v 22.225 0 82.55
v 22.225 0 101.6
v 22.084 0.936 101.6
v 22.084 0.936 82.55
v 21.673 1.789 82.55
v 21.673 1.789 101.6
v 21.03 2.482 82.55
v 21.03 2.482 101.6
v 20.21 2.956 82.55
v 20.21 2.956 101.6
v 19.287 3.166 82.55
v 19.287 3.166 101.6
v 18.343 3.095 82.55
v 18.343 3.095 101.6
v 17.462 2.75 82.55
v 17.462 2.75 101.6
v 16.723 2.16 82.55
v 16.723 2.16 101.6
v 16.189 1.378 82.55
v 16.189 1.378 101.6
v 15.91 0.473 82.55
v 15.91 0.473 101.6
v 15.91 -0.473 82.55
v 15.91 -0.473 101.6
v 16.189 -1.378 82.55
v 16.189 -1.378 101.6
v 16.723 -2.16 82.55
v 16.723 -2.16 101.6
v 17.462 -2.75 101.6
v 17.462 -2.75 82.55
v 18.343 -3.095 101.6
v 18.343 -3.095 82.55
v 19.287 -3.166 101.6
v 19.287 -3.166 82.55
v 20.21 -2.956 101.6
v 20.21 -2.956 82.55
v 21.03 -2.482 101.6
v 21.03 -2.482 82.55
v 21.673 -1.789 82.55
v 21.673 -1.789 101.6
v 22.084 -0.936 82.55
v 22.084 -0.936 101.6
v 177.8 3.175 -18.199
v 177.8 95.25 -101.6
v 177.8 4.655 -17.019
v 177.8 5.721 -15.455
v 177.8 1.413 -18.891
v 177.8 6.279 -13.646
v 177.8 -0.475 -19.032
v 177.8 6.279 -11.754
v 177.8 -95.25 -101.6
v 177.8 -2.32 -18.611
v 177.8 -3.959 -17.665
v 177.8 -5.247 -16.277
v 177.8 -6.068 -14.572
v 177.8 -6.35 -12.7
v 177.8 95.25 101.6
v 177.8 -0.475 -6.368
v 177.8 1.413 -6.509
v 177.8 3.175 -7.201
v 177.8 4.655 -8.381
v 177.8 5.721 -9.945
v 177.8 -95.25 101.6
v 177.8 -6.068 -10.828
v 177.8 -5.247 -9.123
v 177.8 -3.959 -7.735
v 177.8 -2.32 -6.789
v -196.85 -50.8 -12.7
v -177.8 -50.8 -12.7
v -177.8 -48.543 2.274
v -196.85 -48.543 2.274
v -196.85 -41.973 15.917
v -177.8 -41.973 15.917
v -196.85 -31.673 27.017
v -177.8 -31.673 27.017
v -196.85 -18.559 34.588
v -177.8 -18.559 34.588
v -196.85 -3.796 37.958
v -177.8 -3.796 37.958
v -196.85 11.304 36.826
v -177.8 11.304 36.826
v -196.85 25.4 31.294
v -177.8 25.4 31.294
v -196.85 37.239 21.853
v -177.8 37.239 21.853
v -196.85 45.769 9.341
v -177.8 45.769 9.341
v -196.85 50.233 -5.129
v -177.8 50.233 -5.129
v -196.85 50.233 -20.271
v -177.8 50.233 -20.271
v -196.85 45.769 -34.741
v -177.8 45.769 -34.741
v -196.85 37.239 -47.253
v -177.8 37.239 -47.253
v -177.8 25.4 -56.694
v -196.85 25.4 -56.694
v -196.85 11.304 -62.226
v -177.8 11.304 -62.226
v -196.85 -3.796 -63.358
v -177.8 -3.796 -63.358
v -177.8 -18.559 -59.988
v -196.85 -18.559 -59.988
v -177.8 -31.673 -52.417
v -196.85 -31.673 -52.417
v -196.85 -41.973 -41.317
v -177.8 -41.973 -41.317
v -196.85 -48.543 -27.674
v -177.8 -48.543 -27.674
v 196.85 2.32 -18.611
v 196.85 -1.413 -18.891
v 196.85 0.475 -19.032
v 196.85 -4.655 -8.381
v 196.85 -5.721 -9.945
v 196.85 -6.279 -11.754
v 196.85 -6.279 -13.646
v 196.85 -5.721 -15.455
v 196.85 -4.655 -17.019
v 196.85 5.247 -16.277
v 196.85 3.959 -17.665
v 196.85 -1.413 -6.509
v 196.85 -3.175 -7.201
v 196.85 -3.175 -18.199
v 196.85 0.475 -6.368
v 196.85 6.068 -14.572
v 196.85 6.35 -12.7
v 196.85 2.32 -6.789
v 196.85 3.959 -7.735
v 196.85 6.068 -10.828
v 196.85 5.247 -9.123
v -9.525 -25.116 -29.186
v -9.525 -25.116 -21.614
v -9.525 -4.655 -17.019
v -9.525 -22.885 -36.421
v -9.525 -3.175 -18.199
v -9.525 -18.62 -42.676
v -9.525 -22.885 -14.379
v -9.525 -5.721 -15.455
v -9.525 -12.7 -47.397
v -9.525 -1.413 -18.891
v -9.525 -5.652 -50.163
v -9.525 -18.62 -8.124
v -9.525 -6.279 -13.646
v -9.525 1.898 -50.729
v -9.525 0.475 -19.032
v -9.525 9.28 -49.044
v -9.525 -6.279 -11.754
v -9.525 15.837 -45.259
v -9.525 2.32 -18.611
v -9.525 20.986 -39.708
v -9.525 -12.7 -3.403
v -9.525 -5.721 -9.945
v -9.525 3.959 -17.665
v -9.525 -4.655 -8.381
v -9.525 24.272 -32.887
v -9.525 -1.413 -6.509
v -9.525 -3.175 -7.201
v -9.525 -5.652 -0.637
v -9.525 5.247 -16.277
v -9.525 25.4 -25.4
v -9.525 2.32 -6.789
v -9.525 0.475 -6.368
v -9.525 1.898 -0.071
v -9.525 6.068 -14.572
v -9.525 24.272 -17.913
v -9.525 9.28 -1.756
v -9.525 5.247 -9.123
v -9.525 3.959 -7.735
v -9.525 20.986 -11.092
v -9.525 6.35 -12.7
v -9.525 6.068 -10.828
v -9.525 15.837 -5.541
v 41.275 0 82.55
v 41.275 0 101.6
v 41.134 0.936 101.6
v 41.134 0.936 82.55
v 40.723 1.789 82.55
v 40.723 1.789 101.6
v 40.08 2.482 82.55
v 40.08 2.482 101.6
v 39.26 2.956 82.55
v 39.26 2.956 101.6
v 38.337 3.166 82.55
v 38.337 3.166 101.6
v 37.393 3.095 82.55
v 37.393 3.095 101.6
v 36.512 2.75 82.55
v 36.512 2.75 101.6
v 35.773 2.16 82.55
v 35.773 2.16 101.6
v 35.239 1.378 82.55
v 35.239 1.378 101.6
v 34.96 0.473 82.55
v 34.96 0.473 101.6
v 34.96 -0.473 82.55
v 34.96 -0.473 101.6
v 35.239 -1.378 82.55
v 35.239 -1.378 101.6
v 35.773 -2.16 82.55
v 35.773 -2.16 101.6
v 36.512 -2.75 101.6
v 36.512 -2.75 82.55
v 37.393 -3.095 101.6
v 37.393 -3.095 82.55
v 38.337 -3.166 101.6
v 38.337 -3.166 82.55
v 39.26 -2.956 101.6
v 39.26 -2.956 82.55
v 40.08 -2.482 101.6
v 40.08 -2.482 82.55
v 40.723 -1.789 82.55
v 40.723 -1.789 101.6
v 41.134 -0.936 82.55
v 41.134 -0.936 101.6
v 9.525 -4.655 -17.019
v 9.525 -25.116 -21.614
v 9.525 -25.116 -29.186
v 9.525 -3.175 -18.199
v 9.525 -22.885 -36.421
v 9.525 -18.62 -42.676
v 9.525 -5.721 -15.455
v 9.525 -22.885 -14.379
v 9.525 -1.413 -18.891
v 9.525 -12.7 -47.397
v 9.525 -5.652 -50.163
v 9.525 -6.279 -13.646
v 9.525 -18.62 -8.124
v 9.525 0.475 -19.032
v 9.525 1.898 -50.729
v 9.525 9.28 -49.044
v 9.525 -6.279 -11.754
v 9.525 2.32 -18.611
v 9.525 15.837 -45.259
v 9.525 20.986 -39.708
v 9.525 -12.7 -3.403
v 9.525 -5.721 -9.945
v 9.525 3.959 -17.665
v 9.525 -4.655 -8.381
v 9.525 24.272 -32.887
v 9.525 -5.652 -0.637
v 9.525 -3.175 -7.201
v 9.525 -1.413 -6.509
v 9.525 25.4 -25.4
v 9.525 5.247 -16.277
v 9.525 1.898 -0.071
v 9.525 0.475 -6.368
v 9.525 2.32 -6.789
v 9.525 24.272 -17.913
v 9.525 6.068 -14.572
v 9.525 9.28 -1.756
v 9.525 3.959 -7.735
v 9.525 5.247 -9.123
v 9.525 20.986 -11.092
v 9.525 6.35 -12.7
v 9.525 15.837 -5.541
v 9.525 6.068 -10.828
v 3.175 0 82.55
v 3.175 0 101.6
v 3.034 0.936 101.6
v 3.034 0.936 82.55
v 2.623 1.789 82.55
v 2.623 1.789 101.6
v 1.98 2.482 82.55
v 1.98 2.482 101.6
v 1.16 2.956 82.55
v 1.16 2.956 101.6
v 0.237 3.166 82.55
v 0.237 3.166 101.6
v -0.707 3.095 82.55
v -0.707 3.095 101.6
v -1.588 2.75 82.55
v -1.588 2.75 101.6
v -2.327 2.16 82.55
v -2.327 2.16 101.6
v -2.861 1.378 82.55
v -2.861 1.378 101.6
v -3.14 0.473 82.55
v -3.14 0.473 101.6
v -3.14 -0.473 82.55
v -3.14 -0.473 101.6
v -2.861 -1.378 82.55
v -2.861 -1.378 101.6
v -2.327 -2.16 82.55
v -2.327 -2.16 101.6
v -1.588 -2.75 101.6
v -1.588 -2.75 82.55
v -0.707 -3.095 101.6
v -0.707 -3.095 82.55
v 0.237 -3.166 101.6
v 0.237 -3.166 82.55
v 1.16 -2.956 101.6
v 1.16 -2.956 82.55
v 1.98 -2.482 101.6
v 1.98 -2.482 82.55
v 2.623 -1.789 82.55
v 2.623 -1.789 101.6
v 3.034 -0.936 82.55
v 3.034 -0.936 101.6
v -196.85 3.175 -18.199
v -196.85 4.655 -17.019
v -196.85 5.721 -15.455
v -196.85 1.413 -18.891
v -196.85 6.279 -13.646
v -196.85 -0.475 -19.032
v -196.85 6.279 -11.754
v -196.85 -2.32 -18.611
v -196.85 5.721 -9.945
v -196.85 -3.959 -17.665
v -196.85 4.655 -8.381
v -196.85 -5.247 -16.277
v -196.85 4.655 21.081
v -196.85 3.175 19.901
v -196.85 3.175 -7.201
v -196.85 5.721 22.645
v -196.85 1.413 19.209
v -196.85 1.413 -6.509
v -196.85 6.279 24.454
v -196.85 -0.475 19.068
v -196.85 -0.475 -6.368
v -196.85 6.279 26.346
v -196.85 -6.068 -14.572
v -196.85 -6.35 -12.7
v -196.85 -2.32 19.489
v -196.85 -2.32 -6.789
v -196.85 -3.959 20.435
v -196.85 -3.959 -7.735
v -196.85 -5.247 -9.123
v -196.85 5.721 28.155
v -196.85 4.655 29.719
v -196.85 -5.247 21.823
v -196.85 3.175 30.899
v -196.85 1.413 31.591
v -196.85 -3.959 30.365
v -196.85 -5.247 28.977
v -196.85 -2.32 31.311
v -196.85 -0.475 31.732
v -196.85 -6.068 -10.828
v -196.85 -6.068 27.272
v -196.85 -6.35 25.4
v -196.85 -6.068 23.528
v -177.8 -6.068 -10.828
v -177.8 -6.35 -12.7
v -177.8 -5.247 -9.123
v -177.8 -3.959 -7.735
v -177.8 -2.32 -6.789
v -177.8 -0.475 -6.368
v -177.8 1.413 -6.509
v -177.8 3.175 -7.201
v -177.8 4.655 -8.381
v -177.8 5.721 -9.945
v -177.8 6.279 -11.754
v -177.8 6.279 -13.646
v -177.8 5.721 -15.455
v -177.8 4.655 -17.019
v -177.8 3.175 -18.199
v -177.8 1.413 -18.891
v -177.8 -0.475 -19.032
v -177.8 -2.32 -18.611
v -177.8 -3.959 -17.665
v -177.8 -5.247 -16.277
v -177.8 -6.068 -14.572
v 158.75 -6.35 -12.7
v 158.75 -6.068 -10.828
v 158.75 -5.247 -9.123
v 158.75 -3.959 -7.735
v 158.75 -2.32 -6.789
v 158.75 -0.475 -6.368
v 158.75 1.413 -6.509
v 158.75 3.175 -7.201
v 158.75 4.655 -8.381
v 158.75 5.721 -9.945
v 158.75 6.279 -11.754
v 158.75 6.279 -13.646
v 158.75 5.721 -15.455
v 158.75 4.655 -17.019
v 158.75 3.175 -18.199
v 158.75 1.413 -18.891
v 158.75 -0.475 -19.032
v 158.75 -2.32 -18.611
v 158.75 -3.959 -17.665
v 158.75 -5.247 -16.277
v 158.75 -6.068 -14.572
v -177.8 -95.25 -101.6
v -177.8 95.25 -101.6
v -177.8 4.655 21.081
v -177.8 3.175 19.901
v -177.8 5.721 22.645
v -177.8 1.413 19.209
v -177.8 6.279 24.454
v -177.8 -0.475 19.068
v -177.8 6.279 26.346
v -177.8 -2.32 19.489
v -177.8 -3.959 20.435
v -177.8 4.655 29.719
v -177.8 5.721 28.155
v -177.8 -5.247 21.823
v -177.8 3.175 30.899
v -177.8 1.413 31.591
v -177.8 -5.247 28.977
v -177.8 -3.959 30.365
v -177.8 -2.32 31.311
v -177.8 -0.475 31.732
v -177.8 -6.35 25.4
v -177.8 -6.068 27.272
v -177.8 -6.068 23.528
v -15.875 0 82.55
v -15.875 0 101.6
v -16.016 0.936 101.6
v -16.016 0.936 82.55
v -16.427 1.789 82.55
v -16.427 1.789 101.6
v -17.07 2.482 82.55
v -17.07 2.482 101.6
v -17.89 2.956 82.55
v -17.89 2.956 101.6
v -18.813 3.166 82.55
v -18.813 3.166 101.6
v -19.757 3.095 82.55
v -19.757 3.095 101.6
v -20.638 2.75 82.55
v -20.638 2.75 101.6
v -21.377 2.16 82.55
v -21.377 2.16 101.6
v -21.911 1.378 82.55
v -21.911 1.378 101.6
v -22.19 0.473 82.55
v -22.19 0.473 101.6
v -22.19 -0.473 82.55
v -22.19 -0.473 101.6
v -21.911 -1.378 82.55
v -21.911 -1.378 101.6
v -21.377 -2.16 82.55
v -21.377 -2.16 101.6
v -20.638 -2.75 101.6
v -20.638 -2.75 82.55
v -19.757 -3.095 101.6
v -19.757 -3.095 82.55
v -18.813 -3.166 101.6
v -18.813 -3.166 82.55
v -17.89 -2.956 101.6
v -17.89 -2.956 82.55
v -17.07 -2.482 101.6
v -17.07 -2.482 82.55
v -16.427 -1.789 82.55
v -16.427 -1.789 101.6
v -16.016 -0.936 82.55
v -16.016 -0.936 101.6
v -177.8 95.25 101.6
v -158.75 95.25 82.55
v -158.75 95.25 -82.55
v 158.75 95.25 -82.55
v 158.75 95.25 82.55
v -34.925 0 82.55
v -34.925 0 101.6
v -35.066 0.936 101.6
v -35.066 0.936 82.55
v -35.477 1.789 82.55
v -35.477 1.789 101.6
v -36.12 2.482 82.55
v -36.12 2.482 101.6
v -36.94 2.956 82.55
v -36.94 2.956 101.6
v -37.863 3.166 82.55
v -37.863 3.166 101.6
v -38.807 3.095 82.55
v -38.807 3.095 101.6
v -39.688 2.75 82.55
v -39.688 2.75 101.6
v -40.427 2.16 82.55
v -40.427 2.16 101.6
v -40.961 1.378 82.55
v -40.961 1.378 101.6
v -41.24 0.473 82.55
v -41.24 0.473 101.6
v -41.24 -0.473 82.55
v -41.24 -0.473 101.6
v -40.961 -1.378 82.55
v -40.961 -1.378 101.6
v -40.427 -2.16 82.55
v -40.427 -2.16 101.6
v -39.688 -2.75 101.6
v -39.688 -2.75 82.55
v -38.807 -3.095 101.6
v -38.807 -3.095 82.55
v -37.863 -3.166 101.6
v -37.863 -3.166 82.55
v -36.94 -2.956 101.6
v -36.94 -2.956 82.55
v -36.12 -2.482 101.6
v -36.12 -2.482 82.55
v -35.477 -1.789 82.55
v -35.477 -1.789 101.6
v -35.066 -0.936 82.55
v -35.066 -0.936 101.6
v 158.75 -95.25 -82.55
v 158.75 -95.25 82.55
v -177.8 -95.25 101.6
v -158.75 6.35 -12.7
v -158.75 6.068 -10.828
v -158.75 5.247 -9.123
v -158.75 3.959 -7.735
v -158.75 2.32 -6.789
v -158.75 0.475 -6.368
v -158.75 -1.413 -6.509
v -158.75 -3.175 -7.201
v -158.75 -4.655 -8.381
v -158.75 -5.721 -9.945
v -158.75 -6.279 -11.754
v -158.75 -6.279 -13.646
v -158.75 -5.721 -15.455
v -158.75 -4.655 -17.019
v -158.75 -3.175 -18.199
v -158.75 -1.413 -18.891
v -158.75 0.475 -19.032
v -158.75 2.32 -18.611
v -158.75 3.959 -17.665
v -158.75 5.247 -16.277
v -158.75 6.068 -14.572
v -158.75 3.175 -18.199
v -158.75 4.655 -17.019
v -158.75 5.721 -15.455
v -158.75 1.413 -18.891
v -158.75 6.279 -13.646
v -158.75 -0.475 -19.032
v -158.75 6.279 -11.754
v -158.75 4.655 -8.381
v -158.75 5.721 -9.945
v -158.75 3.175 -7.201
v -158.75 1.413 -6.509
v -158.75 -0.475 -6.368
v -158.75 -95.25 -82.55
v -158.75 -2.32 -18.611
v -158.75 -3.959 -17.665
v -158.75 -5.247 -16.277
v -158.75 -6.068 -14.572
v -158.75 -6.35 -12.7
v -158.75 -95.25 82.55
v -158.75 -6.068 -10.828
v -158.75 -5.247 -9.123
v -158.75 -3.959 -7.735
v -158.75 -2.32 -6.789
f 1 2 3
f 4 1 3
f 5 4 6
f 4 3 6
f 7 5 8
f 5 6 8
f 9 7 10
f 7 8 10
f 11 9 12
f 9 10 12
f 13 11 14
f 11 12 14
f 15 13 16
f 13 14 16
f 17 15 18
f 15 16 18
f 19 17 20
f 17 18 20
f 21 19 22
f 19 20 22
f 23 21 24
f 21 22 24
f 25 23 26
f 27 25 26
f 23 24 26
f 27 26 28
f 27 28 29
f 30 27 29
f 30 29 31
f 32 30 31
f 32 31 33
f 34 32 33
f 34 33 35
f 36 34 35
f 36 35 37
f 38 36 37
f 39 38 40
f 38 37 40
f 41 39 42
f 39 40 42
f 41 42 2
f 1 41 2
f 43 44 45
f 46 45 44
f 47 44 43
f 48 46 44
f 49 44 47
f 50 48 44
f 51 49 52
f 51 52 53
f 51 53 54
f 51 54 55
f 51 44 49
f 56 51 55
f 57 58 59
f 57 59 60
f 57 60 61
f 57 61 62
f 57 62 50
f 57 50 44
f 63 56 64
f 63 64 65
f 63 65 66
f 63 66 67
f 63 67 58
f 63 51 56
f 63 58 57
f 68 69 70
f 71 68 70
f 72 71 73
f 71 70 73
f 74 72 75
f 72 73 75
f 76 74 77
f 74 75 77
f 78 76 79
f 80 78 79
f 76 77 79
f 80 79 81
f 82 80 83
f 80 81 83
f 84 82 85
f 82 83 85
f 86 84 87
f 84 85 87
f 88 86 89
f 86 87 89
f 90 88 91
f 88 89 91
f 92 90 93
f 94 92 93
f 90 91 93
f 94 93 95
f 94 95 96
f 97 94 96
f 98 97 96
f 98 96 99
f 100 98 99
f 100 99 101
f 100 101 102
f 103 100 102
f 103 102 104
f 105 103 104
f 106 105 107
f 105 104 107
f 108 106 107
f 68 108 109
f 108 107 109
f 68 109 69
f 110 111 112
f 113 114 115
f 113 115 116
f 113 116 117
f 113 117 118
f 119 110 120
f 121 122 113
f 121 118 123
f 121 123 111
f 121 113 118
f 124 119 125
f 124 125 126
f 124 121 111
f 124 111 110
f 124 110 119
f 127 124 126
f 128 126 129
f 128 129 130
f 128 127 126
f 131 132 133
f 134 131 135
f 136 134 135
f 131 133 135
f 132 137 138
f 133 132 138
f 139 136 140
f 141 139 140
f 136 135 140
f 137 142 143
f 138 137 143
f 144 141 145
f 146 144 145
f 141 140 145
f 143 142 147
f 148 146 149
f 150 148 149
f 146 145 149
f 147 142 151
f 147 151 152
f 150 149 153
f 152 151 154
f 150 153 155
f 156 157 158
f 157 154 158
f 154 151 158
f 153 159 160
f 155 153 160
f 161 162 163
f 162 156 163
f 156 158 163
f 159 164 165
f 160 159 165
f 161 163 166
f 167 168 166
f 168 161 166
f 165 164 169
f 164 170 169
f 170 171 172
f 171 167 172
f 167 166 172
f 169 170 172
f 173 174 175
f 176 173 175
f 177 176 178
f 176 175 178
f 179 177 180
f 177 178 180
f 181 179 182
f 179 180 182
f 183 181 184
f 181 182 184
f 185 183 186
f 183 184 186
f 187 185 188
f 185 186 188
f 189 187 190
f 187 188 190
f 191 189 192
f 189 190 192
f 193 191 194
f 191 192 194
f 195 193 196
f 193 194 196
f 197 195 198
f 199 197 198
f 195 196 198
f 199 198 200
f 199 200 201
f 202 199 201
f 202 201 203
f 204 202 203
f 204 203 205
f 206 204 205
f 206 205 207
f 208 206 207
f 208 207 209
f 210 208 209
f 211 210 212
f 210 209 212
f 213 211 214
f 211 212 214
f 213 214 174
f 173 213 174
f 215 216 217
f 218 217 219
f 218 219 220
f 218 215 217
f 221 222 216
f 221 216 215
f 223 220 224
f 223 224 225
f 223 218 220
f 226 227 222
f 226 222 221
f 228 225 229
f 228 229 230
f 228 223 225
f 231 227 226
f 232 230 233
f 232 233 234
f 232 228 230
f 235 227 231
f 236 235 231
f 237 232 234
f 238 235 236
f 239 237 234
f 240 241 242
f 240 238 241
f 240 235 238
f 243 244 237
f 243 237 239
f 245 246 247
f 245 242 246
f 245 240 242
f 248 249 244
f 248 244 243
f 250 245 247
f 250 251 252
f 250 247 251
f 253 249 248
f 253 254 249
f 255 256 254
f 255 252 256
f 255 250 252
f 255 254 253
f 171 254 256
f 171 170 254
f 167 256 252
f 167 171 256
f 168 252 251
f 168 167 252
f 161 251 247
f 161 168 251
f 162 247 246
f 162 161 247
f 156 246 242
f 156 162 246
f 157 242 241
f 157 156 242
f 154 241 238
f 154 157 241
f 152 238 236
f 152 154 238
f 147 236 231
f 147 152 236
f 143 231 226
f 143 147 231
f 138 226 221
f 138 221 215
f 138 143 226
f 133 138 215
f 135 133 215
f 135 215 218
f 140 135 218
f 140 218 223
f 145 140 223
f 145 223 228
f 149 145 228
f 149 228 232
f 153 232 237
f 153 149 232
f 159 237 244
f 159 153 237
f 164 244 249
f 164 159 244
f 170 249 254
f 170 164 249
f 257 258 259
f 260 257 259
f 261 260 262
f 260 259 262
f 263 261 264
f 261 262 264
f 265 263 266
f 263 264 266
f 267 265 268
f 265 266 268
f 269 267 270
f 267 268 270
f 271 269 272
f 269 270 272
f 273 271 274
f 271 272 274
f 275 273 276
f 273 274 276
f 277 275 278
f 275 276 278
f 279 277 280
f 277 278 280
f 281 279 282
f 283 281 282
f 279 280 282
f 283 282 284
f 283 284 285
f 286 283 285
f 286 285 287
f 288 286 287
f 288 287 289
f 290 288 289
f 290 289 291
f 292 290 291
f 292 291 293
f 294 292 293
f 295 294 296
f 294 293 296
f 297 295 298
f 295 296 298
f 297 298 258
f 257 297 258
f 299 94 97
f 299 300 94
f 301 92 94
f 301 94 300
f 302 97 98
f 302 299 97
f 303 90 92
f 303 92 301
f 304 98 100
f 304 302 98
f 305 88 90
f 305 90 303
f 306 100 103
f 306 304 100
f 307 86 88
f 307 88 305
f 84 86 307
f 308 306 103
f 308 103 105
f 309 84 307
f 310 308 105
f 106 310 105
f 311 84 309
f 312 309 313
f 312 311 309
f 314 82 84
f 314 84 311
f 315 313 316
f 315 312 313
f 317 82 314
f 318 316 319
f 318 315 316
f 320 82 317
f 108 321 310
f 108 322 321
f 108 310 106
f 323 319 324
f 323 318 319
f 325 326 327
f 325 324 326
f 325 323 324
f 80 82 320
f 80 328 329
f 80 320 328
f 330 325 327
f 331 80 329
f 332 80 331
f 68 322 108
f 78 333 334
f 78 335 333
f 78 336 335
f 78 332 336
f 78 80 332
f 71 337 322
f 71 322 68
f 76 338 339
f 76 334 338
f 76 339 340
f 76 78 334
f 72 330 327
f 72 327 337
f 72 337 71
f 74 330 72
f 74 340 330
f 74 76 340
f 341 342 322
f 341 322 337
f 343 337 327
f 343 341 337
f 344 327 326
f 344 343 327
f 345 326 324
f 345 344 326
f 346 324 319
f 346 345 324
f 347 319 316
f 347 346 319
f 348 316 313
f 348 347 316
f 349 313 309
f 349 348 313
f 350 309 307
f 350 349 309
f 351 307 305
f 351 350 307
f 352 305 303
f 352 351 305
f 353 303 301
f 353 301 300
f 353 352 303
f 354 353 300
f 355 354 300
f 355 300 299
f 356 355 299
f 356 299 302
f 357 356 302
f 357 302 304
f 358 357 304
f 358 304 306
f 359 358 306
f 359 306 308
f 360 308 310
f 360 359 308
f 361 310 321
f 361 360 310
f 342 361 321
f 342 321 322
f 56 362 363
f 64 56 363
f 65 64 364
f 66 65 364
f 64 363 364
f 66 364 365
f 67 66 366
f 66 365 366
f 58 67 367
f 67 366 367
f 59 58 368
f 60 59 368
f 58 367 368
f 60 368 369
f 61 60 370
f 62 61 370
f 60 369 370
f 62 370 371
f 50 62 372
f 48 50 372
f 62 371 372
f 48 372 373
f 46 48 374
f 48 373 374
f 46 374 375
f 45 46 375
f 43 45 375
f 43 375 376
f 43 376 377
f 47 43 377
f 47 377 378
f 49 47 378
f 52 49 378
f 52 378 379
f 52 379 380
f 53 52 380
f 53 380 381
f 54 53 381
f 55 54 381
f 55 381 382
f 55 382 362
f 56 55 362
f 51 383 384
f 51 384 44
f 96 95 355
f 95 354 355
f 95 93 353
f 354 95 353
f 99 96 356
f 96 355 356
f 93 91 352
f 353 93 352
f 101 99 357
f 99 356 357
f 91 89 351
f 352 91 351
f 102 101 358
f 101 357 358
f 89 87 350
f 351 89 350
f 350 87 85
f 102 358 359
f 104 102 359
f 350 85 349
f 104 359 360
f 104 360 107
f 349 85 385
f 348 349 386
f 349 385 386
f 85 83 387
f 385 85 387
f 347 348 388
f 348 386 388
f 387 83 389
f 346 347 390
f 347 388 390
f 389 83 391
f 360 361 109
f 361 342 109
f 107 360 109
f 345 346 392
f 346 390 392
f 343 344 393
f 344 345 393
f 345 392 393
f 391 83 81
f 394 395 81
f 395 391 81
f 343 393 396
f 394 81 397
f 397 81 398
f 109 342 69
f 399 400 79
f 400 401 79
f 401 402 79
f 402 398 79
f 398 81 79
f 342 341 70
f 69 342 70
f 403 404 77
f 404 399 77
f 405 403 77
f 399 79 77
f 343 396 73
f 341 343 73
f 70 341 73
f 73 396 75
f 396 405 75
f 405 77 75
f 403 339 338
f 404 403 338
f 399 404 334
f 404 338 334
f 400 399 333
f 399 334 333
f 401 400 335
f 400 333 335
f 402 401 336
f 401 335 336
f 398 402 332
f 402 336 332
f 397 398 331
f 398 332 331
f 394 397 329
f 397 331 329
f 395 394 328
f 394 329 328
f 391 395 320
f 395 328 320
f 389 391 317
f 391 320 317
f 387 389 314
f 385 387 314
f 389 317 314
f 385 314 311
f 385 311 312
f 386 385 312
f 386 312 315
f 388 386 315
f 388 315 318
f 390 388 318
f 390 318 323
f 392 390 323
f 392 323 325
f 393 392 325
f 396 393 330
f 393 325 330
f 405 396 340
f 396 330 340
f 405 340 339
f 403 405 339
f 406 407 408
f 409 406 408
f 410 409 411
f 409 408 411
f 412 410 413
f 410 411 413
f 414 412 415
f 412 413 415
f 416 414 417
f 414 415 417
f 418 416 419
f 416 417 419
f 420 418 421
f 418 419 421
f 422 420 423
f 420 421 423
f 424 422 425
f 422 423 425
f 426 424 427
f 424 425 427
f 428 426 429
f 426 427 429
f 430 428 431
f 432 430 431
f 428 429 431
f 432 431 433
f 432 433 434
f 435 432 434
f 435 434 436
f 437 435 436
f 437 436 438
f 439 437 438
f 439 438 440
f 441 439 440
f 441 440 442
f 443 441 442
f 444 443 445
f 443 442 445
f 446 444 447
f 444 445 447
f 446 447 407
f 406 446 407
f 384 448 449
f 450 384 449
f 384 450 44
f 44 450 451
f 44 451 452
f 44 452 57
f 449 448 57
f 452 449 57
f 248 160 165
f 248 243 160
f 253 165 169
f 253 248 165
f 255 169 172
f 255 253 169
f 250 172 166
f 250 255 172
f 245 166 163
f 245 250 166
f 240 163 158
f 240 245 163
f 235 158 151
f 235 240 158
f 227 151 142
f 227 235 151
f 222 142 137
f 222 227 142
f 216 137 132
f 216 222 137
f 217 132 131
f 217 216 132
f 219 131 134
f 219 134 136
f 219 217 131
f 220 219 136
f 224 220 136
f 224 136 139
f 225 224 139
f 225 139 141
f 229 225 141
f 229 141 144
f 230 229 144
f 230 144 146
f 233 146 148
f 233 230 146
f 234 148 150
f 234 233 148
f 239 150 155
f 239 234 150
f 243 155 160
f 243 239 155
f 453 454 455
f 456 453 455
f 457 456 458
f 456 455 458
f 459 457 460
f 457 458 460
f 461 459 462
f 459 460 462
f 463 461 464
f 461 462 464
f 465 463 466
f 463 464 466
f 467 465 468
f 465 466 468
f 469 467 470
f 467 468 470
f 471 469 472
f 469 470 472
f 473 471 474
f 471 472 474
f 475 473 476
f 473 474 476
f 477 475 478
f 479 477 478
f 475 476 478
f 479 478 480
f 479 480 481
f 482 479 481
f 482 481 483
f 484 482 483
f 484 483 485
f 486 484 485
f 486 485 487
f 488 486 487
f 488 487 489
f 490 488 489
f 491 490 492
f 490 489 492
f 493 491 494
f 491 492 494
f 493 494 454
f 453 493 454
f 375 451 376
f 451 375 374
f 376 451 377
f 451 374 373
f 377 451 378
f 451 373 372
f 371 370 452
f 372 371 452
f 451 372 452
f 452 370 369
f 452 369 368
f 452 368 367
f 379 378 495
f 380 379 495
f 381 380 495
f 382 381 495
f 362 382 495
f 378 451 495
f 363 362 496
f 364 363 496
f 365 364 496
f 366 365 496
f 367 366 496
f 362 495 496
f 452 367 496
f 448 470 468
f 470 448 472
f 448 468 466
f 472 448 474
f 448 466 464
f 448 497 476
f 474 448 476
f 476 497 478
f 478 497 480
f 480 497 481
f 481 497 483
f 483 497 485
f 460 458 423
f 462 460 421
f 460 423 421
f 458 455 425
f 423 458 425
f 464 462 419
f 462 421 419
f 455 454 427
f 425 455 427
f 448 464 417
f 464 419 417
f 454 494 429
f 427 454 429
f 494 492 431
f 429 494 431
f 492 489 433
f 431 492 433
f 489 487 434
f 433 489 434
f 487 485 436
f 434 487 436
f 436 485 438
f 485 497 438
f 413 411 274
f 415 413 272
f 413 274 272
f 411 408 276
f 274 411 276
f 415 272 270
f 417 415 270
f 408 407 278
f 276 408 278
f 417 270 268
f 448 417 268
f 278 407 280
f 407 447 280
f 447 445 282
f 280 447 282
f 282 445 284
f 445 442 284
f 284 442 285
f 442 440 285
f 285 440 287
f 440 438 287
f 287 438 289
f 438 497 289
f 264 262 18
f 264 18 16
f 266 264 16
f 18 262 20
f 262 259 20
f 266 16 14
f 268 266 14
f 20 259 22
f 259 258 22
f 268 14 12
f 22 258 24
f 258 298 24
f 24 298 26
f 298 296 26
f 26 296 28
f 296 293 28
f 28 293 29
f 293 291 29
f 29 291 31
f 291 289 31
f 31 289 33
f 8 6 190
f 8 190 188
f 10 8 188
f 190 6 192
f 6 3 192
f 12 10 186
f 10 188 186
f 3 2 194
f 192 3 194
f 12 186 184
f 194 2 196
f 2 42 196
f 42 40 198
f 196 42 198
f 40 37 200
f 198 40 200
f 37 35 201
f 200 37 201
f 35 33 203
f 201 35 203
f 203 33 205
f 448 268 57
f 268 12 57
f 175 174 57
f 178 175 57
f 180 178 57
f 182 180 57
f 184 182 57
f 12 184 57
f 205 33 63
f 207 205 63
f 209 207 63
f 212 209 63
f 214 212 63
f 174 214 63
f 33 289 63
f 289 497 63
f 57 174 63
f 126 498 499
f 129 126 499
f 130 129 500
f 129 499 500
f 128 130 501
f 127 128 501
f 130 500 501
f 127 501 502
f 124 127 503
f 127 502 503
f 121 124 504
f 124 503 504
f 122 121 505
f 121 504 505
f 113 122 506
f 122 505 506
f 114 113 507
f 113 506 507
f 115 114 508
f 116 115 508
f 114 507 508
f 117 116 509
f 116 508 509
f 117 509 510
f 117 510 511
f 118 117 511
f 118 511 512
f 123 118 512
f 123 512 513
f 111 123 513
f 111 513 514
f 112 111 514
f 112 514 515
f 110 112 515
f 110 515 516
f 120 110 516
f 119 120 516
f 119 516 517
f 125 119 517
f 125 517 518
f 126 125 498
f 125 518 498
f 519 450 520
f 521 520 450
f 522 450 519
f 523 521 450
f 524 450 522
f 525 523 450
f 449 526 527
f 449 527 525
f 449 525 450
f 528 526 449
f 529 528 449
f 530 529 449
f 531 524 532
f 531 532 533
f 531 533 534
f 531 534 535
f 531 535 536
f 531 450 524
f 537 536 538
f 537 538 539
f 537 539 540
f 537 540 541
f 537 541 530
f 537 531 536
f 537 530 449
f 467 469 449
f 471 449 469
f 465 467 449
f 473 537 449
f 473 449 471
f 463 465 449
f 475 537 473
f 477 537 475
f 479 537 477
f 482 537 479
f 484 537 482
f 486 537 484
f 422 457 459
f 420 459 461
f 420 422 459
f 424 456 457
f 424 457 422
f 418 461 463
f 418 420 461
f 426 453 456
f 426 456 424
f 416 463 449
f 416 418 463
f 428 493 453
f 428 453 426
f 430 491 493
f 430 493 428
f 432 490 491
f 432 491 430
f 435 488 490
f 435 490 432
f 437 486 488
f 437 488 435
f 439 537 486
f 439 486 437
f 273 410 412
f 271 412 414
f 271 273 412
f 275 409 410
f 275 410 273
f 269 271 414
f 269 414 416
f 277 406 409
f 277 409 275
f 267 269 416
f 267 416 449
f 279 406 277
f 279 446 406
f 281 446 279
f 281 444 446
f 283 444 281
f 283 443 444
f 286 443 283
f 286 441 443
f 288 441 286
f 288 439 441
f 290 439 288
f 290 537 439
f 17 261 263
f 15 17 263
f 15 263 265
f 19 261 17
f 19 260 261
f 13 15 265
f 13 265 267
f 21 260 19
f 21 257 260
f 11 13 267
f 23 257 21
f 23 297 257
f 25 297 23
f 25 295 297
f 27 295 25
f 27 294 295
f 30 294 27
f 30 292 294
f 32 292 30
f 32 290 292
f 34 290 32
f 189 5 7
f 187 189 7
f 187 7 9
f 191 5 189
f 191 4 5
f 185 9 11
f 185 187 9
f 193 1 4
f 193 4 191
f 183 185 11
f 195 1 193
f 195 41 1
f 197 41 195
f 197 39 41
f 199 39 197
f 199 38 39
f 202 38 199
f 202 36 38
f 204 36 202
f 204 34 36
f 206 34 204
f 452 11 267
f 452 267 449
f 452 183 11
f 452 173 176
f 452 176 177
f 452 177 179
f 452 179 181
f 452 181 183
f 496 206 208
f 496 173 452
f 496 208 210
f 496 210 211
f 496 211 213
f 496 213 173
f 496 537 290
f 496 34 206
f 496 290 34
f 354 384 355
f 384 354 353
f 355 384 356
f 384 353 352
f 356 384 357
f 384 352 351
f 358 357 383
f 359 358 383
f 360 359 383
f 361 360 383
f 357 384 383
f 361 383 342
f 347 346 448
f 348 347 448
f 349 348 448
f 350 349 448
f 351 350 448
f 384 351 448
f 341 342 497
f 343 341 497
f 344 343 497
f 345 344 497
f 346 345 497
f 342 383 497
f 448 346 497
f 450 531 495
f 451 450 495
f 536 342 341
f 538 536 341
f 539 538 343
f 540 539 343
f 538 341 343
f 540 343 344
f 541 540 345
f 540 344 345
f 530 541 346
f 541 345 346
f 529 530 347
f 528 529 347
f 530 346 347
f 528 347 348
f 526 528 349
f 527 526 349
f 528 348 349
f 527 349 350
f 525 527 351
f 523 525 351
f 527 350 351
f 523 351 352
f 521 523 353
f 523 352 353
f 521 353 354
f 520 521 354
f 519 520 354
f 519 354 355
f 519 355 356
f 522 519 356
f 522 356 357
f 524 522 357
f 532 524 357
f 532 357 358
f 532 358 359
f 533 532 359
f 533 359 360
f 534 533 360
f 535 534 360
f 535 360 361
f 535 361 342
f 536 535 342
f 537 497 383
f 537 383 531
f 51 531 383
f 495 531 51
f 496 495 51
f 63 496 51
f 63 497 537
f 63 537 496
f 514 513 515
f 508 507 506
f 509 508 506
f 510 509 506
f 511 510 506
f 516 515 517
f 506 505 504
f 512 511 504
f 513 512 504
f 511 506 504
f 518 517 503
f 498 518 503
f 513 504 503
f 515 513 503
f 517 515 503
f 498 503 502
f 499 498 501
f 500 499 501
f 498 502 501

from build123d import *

# Parameters (mm, degrees)
F0_W      = 355.6
F0_H      = 203.2
F0_W_2    = 317.5
F0_H_2    = 165.1
F1_DEPTH  = 95.25
F2_R      = 6.35
F3_DEPTH  = 355.601
F4_R      = 50.8
F4_R_2    = 6.35
F5_DEPTH  = 19.05
F6_R      = 6.35
F7_DEPTH  = 19.05
F9_R      = 6.35
F10_DEPTH = 355.6
F11_R     = 25.4
F11_R_2   = 6.35
F12_DEPTH = 9.525
F13_R     = 3.175
F14_DEPTH = 19.05


# Not quite as in the source:
# - the program builds the solid bodies; features that only make, move or delete a surface that nothing else refers to are left out


with BuildPart() as f1:
    # F0 (on Front) → F1 (new body, symmetric)
    with BuildSketch(Plane.XZ):
        Rectangle(F0_W, F0_H)
        Rectangle(F0_W_2, F0_H_2, mode=Mode.SUBTRACT)
    extrude(amount=F1_DEPTH, both=True)

    # F2 (on face) → F3 (cut, through all)
    with BuildSketch(Plane(origin=(-177.8, 0, 0), x_dir=(0, -1, 0), z_dir=(-1, 0, 0))):
        with Locations((0, -12.7)):
            Circle(F2_R)
    extrude(amount=-F3_DEPTH, mode=Mode.SUBTRACT)

    # F13 (on face) → F14 (cut, through all)
    with BuildSketch(Plane.XY.offset(101.6)):
        with Locations((-38.1, 0)):
            Circle(F13_R)
        with Locations((-19.05, 0)):
            Circle(F13_R)
        Circle(F13_R)
        with Locations((19.05, 0)):
            Circle(F13_R)
        with Locations((38.1, 0)):
            Circle(F13_R)
    extrude(amount=-F14_DEPTH, mode=Mode.SUBTRACT)


with BuildPart() as f5:
    # F4 (on face) → F5 (new body)
    with BuildSketch(Plane(origin=(-177.8, 0, 0), x_dir=(0, -1, 0), z_dir=(-1, 0, 0))):
        with Locations((0, -12.7)):
            Circle(F4_R)
        with Locations((0, -12.7)):
            Circle(F4_R_2, mode=Mode.SUBTRACT)
    extrude(amount=F5_DEPTH)

    # F6 (on face) → F7 (cut, through all)
    with BuildSketch(Plane(origin=(-196.85, 0, 0), x_dir=(0, -1, 0), z_dir=(-1, 0, 0))):
        with Locations((0, 25.4)):
            Circle(F6_R)
    extrude(amount=-F7_DEPTH, mode=Mode.SUBTRACT)


with BuildPart() as f10:
    # F9 (on face) → F10 (new body)
    with BuildSketch(Plane.YZ.offset(-158.75)):
        with Locations((0, -12.7)):
            Circle(F9_R)
    extrude(amount=F10_DEPTH)


with BuildPart() as f12:
    # F11 (on Right) → F12 (new body, symmetric)
    with BuildSketch(Plane.YZ):
        with Locations((0, -25.4)):
            Circle(F11_R)
        with Locations((0, -12.7)):
            Circle(F11_R_2, mode=Mode.SUBTRACT)
    extrude(amount=F12_DEPTH, both=True)


solid = Compound([f1.part, f5.part, f10.part, f12.part])
